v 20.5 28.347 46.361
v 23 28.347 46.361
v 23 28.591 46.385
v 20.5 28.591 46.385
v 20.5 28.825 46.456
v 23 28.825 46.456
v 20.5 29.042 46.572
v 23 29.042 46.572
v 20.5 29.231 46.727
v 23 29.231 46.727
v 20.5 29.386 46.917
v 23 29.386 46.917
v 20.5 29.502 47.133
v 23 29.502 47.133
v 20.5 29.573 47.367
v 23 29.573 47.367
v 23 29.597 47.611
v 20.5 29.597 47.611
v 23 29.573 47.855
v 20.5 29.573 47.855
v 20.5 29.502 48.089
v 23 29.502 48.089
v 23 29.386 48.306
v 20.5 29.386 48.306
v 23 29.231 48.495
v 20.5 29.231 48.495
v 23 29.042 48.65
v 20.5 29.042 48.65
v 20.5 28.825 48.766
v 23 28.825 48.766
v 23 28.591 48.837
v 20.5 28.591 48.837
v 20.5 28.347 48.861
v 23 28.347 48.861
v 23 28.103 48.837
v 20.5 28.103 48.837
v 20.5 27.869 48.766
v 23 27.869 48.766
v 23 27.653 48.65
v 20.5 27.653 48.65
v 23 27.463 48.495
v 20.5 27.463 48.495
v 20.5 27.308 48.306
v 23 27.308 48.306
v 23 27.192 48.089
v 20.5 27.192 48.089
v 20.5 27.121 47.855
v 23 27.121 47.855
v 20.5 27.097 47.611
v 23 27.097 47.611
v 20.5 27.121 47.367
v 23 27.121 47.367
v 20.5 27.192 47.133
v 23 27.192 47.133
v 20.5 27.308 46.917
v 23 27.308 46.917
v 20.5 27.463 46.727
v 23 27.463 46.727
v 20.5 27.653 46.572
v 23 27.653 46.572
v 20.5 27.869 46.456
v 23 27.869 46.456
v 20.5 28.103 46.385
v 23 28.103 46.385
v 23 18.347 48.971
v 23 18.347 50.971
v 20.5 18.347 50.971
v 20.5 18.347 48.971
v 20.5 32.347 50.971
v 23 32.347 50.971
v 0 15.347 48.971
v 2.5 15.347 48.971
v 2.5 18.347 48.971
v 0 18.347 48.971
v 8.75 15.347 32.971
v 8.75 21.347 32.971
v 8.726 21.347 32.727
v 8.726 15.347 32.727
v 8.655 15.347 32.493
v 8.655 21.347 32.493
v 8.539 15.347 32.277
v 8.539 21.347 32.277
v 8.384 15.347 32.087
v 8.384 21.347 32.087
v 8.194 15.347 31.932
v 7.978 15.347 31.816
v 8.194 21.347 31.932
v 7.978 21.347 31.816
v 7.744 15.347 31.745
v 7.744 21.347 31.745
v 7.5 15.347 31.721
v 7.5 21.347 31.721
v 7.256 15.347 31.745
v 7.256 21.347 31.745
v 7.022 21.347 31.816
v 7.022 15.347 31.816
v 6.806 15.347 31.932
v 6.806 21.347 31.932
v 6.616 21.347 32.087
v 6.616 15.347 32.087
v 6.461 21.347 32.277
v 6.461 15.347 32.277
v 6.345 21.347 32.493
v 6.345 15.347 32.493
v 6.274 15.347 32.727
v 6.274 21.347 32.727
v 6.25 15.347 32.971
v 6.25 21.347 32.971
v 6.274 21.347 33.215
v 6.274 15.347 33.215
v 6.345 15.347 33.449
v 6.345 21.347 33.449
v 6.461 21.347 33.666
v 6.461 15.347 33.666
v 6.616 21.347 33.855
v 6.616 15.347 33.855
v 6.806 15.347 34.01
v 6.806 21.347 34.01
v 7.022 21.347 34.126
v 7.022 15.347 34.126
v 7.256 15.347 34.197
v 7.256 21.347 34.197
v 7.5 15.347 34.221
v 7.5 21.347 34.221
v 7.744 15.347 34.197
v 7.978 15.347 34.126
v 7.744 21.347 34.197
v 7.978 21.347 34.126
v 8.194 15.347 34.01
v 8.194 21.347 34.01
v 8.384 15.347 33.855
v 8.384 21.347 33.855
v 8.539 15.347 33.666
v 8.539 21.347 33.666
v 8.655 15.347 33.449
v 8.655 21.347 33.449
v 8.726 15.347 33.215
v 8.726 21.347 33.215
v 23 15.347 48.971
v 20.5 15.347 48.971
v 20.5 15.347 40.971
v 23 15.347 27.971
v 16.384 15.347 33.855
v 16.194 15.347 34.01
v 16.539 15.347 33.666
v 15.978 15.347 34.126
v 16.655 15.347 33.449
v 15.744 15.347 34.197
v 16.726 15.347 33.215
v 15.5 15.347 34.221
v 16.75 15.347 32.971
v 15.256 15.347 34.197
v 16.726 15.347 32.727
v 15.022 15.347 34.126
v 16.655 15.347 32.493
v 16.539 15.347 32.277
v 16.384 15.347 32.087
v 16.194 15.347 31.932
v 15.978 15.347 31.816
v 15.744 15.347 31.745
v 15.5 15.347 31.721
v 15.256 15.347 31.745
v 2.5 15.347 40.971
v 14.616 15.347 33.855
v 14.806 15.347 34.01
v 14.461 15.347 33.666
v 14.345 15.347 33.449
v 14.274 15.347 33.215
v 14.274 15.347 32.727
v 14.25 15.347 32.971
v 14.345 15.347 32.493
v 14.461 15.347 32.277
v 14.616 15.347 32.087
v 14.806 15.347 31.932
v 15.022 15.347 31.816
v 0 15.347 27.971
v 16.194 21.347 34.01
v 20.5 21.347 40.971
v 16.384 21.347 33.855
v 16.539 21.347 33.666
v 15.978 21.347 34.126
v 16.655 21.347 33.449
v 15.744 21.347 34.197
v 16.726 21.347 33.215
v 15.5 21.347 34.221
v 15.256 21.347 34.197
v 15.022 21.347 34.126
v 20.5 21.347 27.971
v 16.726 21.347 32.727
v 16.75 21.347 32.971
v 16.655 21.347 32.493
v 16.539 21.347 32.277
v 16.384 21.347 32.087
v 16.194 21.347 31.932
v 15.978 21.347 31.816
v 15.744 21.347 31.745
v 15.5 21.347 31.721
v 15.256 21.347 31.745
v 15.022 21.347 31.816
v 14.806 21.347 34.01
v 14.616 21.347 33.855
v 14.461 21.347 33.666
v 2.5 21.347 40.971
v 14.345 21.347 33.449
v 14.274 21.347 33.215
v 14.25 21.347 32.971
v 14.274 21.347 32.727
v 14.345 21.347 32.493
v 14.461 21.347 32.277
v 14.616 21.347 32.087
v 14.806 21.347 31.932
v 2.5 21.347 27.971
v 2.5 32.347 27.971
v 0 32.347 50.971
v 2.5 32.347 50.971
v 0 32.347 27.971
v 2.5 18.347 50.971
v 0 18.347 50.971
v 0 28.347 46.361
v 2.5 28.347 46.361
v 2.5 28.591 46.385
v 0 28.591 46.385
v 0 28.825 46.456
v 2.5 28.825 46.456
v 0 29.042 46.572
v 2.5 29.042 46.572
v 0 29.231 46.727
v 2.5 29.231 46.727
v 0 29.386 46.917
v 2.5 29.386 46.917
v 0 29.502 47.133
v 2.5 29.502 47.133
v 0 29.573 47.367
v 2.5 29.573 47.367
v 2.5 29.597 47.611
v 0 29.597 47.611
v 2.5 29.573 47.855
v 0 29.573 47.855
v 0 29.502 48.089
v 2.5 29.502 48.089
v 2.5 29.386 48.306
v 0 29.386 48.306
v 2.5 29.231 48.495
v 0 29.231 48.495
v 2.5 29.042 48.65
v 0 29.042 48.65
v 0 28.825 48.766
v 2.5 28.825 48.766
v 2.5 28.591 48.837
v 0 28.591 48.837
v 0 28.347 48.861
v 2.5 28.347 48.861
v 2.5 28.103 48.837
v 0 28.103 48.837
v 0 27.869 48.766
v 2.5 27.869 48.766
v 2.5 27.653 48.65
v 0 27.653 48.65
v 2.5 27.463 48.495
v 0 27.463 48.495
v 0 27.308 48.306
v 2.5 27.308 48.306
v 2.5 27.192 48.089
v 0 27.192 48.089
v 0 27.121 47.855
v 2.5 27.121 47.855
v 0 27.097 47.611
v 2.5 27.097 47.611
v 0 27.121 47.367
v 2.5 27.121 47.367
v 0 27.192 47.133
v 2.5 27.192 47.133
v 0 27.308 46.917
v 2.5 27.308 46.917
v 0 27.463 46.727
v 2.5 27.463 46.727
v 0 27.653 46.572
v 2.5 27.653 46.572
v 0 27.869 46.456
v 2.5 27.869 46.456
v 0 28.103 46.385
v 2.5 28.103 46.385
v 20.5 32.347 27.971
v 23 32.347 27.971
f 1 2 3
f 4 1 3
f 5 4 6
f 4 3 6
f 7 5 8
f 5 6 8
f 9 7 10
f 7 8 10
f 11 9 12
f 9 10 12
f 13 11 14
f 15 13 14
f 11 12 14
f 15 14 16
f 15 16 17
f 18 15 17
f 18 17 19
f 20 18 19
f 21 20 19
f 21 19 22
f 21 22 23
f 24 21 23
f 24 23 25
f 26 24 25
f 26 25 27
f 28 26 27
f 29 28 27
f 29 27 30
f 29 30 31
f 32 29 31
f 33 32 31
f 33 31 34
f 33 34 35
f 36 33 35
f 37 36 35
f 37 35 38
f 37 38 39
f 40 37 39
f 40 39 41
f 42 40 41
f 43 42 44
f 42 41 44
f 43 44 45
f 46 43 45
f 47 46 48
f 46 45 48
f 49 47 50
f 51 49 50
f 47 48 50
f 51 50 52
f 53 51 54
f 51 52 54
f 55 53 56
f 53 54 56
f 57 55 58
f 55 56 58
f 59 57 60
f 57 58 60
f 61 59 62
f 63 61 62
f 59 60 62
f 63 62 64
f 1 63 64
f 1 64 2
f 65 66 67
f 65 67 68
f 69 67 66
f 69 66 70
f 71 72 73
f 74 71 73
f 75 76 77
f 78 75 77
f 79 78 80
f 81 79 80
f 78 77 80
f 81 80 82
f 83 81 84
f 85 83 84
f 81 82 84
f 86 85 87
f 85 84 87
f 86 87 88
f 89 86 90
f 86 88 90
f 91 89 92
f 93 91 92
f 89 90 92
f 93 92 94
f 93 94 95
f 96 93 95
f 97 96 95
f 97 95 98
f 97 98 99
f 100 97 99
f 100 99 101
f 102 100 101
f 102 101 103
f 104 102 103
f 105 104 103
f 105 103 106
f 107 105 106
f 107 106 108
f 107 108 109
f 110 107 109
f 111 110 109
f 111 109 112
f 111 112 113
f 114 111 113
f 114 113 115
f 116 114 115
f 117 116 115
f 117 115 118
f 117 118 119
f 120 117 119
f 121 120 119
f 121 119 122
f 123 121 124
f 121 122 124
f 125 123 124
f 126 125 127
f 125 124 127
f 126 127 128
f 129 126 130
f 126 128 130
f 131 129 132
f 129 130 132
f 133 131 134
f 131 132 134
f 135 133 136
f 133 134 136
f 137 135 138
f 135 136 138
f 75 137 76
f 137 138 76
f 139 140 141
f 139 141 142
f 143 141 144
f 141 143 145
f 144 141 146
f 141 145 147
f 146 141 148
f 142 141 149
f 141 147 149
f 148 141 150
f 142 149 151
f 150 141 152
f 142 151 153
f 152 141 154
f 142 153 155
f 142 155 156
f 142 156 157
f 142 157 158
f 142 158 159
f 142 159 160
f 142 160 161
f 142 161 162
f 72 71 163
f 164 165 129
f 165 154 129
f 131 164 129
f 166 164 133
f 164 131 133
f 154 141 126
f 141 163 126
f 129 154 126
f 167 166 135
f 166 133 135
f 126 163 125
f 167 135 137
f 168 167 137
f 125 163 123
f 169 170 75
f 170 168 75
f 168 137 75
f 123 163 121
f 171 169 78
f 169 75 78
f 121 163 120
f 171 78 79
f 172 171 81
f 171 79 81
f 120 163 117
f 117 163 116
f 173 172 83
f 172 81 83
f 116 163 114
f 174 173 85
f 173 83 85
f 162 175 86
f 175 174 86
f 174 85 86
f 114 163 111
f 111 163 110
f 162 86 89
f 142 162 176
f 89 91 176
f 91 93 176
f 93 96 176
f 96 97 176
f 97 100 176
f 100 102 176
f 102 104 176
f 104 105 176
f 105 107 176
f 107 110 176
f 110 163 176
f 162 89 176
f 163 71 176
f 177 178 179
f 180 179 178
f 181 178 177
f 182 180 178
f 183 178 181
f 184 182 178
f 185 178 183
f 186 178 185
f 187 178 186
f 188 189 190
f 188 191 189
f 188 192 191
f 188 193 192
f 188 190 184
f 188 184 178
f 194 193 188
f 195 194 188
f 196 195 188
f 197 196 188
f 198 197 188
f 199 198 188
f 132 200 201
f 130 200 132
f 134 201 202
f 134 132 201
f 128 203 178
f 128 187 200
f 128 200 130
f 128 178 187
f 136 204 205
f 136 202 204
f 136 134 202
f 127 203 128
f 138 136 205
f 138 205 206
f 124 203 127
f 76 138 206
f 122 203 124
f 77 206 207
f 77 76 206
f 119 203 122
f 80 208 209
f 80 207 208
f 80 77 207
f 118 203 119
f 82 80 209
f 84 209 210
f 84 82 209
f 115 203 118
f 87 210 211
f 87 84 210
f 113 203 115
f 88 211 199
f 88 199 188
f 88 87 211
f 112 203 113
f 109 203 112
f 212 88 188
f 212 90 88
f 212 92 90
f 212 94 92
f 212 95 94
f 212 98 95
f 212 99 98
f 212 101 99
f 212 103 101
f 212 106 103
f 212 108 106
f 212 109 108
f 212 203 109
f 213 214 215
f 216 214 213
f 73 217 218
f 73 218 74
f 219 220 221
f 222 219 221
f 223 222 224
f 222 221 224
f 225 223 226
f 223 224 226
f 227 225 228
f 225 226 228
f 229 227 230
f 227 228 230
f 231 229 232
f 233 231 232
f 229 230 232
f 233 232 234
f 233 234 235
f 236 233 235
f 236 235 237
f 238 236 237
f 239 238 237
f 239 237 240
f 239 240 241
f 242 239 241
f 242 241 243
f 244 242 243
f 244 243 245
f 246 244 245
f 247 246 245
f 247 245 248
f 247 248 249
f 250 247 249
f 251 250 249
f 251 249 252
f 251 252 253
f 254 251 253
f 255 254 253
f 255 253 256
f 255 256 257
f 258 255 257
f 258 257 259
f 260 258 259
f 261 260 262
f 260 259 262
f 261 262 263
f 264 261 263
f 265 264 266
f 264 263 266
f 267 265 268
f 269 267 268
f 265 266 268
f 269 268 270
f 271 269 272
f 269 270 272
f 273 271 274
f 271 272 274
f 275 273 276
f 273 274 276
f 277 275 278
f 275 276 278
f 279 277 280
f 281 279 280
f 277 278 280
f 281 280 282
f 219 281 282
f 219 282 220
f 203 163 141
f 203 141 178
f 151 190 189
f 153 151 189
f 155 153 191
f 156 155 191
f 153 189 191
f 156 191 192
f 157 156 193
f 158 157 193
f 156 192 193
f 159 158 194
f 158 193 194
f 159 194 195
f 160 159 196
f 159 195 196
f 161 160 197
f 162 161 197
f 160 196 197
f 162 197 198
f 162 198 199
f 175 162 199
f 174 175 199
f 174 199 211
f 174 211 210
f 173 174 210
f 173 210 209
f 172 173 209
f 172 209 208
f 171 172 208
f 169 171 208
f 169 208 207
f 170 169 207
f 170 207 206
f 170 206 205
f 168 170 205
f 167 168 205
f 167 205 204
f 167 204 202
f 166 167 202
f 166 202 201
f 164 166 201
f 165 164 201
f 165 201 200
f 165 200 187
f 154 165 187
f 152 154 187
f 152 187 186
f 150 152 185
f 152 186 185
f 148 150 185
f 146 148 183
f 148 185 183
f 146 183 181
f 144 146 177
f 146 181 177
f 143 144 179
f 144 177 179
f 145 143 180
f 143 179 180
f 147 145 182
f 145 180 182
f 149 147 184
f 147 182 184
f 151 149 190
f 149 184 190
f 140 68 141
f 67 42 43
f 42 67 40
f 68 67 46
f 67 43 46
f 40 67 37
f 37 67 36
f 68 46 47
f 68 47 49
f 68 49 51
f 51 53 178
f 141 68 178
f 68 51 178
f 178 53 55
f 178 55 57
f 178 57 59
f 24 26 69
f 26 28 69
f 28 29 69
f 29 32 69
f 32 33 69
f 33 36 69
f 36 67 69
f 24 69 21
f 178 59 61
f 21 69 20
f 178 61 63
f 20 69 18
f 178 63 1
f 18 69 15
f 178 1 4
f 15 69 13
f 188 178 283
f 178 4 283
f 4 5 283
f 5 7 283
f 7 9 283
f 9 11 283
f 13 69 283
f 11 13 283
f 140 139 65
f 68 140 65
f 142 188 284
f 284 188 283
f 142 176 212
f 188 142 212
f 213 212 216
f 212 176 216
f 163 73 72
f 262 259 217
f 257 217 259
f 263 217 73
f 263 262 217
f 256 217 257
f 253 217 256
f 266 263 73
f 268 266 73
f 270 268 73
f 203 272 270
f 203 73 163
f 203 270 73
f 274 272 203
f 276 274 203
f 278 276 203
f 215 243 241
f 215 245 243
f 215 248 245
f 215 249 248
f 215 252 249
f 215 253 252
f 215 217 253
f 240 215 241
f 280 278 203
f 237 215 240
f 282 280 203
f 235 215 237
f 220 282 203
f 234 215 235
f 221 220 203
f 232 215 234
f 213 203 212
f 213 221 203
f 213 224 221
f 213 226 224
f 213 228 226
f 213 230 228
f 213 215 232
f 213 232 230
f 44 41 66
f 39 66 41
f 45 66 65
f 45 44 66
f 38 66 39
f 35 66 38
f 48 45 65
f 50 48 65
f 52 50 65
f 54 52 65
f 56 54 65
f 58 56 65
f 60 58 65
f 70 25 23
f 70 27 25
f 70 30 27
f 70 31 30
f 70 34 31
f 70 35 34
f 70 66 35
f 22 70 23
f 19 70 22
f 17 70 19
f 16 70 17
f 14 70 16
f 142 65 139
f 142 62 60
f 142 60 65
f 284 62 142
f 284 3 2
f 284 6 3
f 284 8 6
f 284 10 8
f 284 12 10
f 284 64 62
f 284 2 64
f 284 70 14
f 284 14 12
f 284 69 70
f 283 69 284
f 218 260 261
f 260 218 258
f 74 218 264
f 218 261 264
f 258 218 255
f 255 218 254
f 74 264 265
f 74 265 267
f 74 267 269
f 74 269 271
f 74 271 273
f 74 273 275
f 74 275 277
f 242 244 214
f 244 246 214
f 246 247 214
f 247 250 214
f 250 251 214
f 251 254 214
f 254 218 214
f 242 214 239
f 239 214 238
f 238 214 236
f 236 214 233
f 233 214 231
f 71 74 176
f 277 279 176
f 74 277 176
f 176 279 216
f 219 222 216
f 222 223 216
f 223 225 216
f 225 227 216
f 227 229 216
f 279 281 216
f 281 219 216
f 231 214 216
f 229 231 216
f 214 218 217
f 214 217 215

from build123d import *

# Parameters (mm, degrees)
SKETCH1_W           = 23
SKETCH1_H           = 17
BOSS_EXTRUDE1_DEPTH = 2.5
SKETCH2_W           = 13
SKETCH2_H           = 6
BOSS_EXTRUDE2_DEPTH = 18
SKETCH3_W           = 23
SKETCH3_H           = 17
BOSS_EXTRUDE3_DEPTH = 2.5
SKETCH5_W           = 2
SKETCH5_H           = 3
CUT_EXTRUDE1_DEPTH  = 24
SKETCH4_R           = 1.25
CUT_EXTRUDE3_DEPTH  = 24
SKETCH7_R           = 1.25
CUT_EXTRUDE4_DEPTH  = 10


with BuildPart() as part:
    # Sketch1 → Boss-Extrude1 (new body)
    with BuildSketch(Plane(origin=(0, 0, 0), x_dir=(0, 0, -1), z_dir=(1, 0, 0))):
        with Locations((-39.471099191, 23.847043717)):
            Rectangle(SKETCH1_W, SKETCH1_H)
    extrude(amount=BOSS_EXTRUDE1_DEPTH)

    # Sketch2 → Boss-Extrude2 (add)
    with BuildSketch(Plane(origin=(2.5, 0, 0), x_dir=(0, 0, -1), z_dir=(1, 0, 0))):
        with Locations((-34.471099191, 18.347043717)):
            Rectangle(SKETCH2_W, SKETCH2_H)
    extrude(amount=BOSS_EXTRUDE2_DEPTH)

    # Sketch3 → Boss-Extrude3 (add)
    with BuildSketch(Plane(origin=(20.5, 0, 0), x_dir=(0, 0, -1), z_dir=(1, 0, 0))):
        with Locations((-39.471099191, 23.847043717)):
            Rectangle(SKETCH3_W, SKETCH3_H)
    extrude(amount=BOSS_EXTRUDE3_DEPTH)

    # Sketch5 → Cut-Extrude1 (cut, through all)
    with BuildSketch(Plane(origin=(23, 0, 0), x_dir=(0, 0, -1), z_dir=(1, 0, 0))):
        with Locations((-49.971099191, 16.847043717)):
            Rectangle(SKETCH5_W, SKETCH5_H)
    extrude(amount=-CUT_EXTRUDE1_DEPTH, mode=Mode.SUBTRACT)

    # Sketch4 → Cut-Extrude3 (cut, through all)
    with BuildSketch(Plane(origin=(23, 0, 0), x_dir=(0, 0, -1), z_dir=(1, 0, 0))):
        with Locations((-47.611099191, 28.347043717)):
            Circle(SKETCH4_R)
    extrude(amount=-CUT_EXTRUDE3_DEPTH, mode=Mode.SUBTRACT)

    # Sketch7 → Cut-Extrude4 (cut)
    with BuildSketch(Plane(origin=(0, 21.347043717, 0), x_dir=(1, 0, 0), z_dir=(0, 1, 0))):
        with Locations((7.5, -32.971099191)):
            Circle(SKETCH7_R)
        with Locations((15.5, -32.971099191)):
            Circle(SKETCH7_R)
    extrude(amount=-CUT_EXTRUDE4_DEPTH, mode=Mode.SUBTRACT)


solid = part.part
